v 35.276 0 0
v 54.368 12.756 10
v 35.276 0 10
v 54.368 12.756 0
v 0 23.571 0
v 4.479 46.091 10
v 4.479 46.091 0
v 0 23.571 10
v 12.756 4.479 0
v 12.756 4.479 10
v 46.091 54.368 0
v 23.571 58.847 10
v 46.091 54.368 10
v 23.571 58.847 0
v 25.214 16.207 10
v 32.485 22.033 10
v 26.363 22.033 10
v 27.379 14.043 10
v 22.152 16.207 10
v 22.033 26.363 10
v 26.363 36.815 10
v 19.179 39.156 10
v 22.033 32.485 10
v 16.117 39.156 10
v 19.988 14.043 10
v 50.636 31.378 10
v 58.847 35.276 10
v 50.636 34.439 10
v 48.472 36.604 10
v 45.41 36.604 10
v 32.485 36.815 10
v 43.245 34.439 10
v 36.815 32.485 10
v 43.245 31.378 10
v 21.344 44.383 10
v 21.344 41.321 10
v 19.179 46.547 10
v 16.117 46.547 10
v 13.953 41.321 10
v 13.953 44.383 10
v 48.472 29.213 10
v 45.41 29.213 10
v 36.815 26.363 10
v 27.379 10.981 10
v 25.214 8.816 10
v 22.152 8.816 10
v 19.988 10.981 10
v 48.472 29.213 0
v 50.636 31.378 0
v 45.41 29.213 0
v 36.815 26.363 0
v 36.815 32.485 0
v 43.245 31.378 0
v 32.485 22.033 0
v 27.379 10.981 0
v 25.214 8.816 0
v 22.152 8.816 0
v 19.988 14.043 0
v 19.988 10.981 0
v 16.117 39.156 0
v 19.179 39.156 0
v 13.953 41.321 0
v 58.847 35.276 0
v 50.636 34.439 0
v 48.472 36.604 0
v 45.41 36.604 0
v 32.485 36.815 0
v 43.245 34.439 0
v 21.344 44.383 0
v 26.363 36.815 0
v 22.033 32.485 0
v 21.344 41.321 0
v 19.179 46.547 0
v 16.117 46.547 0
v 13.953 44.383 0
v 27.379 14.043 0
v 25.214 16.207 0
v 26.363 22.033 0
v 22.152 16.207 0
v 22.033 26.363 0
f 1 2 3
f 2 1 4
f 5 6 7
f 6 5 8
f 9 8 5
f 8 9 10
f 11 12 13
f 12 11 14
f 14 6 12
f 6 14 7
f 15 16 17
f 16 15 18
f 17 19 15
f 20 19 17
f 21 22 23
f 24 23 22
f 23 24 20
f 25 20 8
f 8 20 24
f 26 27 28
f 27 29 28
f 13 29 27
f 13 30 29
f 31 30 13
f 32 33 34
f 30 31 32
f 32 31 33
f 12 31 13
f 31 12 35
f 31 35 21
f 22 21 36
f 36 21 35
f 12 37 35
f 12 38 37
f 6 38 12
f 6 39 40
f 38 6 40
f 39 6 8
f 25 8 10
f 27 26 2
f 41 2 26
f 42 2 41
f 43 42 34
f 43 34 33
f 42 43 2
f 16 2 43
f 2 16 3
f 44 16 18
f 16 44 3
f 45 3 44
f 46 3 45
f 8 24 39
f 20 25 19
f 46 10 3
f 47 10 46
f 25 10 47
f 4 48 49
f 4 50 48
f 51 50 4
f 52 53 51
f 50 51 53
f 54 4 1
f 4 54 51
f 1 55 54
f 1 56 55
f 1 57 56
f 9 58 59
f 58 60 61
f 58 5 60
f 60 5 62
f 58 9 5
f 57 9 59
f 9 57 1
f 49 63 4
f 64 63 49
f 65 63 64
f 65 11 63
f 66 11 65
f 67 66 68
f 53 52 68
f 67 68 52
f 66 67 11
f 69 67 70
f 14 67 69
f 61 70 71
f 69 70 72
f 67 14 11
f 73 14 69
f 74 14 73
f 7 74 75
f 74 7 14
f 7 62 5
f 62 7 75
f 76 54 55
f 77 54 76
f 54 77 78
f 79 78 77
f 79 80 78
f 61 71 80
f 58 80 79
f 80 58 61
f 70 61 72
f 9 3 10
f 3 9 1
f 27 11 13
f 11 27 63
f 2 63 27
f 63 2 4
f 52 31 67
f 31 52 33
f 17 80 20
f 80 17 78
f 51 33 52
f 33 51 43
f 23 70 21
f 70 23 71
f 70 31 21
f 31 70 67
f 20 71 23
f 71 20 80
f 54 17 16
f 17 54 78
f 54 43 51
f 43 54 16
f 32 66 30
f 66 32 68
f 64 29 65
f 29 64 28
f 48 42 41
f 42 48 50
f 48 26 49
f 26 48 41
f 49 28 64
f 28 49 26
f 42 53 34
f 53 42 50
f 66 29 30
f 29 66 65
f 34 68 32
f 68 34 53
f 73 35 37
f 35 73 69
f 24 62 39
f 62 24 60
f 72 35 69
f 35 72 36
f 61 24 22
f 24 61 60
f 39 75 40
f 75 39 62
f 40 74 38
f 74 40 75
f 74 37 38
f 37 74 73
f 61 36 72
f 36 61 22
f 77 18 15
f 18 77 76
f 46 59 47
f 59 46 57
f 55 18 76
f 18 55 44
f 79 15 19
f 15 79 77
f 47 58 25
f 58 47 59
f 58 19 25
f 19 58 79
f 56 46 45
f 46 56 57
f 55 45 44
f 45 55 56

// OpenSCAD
$fn = 32;

// ----------------------------------------------------------------------
// Polygon plate: 8-gon R30, 3 bolt windows
// ----------------------------------------------------------------------

// --- parameters (mm) ---
sides = 8;                // number of polygon sides
plate_r = 30;             // circumscribed radius of the polygon
bore_r = 8;               // centre bore radius
bolts = 3;                // number of bolt windows
ring_r = 17.86;           // bolt-circle radius
bolt_r = 4;               // bolt window radius
plate_t = 10;             // plate thickness, Z (extrusion height)

plate_d = 2 * plate_r;  // circumscribed diameter
bore_d = 2 * bore_r;  // centre bore diameter
bolt_d = 2 * bolt_r;  // bolt window diameter
ring_d = 2 * ring_r;  // bolt-circle diameter

profile = [[58.847, 35.276], [46.091, 54.368], [23.571, 58.847], [4.479, 46.091], [0, 23.571], [12.756, 4.479], [35.276, 0], [54.368, 12.756]];  // primary outline, 8 points, counter clockwise
void_1 = [[36.815, 32.485], [32.485, 36.815], [26.363, 36.815], [22.033, 32.485], [22.033, 26.363], [26.363, 22.033], [32.485, 22.033], [36.815, 26.363]];  // centre bore, 8 points
void_2 = [[50.636, 34.439], [48.472, 36.604], [45.41, 36.604], [43.245, 34.439], [43.245, 31.378], [45.41, 29.213], [48.472, 29.213], [50.636, 31.378]];  // bolt window 1, 8 points
void_3 = [[21.344, 44.383], [19.179, 46.547], [16.117, 46.547], [13.953, 44.383], [13.953, 41.321], [16.117, 39.156], [19.179, 39.156], [21.344, 41.321]];  // bolt window 2, 8 points
void_4 = [[27.379, 14.043], [25.214, 16.207], [22.152, 16.207], [19.988, 14.043], [19.988, 10.981], [22.152, 8.816], [25.214, 8.816], [27.379, 10.981]];  // bolt window 3, 8 points

// --- the one profile operation ---
difference() {
  linear_extrude(height = plate_t) polygon(points = profile);
  translate([0, 0, -1])
    linear_extrude(height = plate_t + 2) polygon(points = void_1);
  translate([0, 0, -1])
    linear_extrude(height = plate_t + 2) polygon(points = void_2);
  translate([0, 0, -1])
    linear_extrude(height = plate_t + 2) polygon(points = void_3);
  translate([0, 0, -1])
    linear_extrude(height = plate_t + 2) polygon(points = void_4);
}
